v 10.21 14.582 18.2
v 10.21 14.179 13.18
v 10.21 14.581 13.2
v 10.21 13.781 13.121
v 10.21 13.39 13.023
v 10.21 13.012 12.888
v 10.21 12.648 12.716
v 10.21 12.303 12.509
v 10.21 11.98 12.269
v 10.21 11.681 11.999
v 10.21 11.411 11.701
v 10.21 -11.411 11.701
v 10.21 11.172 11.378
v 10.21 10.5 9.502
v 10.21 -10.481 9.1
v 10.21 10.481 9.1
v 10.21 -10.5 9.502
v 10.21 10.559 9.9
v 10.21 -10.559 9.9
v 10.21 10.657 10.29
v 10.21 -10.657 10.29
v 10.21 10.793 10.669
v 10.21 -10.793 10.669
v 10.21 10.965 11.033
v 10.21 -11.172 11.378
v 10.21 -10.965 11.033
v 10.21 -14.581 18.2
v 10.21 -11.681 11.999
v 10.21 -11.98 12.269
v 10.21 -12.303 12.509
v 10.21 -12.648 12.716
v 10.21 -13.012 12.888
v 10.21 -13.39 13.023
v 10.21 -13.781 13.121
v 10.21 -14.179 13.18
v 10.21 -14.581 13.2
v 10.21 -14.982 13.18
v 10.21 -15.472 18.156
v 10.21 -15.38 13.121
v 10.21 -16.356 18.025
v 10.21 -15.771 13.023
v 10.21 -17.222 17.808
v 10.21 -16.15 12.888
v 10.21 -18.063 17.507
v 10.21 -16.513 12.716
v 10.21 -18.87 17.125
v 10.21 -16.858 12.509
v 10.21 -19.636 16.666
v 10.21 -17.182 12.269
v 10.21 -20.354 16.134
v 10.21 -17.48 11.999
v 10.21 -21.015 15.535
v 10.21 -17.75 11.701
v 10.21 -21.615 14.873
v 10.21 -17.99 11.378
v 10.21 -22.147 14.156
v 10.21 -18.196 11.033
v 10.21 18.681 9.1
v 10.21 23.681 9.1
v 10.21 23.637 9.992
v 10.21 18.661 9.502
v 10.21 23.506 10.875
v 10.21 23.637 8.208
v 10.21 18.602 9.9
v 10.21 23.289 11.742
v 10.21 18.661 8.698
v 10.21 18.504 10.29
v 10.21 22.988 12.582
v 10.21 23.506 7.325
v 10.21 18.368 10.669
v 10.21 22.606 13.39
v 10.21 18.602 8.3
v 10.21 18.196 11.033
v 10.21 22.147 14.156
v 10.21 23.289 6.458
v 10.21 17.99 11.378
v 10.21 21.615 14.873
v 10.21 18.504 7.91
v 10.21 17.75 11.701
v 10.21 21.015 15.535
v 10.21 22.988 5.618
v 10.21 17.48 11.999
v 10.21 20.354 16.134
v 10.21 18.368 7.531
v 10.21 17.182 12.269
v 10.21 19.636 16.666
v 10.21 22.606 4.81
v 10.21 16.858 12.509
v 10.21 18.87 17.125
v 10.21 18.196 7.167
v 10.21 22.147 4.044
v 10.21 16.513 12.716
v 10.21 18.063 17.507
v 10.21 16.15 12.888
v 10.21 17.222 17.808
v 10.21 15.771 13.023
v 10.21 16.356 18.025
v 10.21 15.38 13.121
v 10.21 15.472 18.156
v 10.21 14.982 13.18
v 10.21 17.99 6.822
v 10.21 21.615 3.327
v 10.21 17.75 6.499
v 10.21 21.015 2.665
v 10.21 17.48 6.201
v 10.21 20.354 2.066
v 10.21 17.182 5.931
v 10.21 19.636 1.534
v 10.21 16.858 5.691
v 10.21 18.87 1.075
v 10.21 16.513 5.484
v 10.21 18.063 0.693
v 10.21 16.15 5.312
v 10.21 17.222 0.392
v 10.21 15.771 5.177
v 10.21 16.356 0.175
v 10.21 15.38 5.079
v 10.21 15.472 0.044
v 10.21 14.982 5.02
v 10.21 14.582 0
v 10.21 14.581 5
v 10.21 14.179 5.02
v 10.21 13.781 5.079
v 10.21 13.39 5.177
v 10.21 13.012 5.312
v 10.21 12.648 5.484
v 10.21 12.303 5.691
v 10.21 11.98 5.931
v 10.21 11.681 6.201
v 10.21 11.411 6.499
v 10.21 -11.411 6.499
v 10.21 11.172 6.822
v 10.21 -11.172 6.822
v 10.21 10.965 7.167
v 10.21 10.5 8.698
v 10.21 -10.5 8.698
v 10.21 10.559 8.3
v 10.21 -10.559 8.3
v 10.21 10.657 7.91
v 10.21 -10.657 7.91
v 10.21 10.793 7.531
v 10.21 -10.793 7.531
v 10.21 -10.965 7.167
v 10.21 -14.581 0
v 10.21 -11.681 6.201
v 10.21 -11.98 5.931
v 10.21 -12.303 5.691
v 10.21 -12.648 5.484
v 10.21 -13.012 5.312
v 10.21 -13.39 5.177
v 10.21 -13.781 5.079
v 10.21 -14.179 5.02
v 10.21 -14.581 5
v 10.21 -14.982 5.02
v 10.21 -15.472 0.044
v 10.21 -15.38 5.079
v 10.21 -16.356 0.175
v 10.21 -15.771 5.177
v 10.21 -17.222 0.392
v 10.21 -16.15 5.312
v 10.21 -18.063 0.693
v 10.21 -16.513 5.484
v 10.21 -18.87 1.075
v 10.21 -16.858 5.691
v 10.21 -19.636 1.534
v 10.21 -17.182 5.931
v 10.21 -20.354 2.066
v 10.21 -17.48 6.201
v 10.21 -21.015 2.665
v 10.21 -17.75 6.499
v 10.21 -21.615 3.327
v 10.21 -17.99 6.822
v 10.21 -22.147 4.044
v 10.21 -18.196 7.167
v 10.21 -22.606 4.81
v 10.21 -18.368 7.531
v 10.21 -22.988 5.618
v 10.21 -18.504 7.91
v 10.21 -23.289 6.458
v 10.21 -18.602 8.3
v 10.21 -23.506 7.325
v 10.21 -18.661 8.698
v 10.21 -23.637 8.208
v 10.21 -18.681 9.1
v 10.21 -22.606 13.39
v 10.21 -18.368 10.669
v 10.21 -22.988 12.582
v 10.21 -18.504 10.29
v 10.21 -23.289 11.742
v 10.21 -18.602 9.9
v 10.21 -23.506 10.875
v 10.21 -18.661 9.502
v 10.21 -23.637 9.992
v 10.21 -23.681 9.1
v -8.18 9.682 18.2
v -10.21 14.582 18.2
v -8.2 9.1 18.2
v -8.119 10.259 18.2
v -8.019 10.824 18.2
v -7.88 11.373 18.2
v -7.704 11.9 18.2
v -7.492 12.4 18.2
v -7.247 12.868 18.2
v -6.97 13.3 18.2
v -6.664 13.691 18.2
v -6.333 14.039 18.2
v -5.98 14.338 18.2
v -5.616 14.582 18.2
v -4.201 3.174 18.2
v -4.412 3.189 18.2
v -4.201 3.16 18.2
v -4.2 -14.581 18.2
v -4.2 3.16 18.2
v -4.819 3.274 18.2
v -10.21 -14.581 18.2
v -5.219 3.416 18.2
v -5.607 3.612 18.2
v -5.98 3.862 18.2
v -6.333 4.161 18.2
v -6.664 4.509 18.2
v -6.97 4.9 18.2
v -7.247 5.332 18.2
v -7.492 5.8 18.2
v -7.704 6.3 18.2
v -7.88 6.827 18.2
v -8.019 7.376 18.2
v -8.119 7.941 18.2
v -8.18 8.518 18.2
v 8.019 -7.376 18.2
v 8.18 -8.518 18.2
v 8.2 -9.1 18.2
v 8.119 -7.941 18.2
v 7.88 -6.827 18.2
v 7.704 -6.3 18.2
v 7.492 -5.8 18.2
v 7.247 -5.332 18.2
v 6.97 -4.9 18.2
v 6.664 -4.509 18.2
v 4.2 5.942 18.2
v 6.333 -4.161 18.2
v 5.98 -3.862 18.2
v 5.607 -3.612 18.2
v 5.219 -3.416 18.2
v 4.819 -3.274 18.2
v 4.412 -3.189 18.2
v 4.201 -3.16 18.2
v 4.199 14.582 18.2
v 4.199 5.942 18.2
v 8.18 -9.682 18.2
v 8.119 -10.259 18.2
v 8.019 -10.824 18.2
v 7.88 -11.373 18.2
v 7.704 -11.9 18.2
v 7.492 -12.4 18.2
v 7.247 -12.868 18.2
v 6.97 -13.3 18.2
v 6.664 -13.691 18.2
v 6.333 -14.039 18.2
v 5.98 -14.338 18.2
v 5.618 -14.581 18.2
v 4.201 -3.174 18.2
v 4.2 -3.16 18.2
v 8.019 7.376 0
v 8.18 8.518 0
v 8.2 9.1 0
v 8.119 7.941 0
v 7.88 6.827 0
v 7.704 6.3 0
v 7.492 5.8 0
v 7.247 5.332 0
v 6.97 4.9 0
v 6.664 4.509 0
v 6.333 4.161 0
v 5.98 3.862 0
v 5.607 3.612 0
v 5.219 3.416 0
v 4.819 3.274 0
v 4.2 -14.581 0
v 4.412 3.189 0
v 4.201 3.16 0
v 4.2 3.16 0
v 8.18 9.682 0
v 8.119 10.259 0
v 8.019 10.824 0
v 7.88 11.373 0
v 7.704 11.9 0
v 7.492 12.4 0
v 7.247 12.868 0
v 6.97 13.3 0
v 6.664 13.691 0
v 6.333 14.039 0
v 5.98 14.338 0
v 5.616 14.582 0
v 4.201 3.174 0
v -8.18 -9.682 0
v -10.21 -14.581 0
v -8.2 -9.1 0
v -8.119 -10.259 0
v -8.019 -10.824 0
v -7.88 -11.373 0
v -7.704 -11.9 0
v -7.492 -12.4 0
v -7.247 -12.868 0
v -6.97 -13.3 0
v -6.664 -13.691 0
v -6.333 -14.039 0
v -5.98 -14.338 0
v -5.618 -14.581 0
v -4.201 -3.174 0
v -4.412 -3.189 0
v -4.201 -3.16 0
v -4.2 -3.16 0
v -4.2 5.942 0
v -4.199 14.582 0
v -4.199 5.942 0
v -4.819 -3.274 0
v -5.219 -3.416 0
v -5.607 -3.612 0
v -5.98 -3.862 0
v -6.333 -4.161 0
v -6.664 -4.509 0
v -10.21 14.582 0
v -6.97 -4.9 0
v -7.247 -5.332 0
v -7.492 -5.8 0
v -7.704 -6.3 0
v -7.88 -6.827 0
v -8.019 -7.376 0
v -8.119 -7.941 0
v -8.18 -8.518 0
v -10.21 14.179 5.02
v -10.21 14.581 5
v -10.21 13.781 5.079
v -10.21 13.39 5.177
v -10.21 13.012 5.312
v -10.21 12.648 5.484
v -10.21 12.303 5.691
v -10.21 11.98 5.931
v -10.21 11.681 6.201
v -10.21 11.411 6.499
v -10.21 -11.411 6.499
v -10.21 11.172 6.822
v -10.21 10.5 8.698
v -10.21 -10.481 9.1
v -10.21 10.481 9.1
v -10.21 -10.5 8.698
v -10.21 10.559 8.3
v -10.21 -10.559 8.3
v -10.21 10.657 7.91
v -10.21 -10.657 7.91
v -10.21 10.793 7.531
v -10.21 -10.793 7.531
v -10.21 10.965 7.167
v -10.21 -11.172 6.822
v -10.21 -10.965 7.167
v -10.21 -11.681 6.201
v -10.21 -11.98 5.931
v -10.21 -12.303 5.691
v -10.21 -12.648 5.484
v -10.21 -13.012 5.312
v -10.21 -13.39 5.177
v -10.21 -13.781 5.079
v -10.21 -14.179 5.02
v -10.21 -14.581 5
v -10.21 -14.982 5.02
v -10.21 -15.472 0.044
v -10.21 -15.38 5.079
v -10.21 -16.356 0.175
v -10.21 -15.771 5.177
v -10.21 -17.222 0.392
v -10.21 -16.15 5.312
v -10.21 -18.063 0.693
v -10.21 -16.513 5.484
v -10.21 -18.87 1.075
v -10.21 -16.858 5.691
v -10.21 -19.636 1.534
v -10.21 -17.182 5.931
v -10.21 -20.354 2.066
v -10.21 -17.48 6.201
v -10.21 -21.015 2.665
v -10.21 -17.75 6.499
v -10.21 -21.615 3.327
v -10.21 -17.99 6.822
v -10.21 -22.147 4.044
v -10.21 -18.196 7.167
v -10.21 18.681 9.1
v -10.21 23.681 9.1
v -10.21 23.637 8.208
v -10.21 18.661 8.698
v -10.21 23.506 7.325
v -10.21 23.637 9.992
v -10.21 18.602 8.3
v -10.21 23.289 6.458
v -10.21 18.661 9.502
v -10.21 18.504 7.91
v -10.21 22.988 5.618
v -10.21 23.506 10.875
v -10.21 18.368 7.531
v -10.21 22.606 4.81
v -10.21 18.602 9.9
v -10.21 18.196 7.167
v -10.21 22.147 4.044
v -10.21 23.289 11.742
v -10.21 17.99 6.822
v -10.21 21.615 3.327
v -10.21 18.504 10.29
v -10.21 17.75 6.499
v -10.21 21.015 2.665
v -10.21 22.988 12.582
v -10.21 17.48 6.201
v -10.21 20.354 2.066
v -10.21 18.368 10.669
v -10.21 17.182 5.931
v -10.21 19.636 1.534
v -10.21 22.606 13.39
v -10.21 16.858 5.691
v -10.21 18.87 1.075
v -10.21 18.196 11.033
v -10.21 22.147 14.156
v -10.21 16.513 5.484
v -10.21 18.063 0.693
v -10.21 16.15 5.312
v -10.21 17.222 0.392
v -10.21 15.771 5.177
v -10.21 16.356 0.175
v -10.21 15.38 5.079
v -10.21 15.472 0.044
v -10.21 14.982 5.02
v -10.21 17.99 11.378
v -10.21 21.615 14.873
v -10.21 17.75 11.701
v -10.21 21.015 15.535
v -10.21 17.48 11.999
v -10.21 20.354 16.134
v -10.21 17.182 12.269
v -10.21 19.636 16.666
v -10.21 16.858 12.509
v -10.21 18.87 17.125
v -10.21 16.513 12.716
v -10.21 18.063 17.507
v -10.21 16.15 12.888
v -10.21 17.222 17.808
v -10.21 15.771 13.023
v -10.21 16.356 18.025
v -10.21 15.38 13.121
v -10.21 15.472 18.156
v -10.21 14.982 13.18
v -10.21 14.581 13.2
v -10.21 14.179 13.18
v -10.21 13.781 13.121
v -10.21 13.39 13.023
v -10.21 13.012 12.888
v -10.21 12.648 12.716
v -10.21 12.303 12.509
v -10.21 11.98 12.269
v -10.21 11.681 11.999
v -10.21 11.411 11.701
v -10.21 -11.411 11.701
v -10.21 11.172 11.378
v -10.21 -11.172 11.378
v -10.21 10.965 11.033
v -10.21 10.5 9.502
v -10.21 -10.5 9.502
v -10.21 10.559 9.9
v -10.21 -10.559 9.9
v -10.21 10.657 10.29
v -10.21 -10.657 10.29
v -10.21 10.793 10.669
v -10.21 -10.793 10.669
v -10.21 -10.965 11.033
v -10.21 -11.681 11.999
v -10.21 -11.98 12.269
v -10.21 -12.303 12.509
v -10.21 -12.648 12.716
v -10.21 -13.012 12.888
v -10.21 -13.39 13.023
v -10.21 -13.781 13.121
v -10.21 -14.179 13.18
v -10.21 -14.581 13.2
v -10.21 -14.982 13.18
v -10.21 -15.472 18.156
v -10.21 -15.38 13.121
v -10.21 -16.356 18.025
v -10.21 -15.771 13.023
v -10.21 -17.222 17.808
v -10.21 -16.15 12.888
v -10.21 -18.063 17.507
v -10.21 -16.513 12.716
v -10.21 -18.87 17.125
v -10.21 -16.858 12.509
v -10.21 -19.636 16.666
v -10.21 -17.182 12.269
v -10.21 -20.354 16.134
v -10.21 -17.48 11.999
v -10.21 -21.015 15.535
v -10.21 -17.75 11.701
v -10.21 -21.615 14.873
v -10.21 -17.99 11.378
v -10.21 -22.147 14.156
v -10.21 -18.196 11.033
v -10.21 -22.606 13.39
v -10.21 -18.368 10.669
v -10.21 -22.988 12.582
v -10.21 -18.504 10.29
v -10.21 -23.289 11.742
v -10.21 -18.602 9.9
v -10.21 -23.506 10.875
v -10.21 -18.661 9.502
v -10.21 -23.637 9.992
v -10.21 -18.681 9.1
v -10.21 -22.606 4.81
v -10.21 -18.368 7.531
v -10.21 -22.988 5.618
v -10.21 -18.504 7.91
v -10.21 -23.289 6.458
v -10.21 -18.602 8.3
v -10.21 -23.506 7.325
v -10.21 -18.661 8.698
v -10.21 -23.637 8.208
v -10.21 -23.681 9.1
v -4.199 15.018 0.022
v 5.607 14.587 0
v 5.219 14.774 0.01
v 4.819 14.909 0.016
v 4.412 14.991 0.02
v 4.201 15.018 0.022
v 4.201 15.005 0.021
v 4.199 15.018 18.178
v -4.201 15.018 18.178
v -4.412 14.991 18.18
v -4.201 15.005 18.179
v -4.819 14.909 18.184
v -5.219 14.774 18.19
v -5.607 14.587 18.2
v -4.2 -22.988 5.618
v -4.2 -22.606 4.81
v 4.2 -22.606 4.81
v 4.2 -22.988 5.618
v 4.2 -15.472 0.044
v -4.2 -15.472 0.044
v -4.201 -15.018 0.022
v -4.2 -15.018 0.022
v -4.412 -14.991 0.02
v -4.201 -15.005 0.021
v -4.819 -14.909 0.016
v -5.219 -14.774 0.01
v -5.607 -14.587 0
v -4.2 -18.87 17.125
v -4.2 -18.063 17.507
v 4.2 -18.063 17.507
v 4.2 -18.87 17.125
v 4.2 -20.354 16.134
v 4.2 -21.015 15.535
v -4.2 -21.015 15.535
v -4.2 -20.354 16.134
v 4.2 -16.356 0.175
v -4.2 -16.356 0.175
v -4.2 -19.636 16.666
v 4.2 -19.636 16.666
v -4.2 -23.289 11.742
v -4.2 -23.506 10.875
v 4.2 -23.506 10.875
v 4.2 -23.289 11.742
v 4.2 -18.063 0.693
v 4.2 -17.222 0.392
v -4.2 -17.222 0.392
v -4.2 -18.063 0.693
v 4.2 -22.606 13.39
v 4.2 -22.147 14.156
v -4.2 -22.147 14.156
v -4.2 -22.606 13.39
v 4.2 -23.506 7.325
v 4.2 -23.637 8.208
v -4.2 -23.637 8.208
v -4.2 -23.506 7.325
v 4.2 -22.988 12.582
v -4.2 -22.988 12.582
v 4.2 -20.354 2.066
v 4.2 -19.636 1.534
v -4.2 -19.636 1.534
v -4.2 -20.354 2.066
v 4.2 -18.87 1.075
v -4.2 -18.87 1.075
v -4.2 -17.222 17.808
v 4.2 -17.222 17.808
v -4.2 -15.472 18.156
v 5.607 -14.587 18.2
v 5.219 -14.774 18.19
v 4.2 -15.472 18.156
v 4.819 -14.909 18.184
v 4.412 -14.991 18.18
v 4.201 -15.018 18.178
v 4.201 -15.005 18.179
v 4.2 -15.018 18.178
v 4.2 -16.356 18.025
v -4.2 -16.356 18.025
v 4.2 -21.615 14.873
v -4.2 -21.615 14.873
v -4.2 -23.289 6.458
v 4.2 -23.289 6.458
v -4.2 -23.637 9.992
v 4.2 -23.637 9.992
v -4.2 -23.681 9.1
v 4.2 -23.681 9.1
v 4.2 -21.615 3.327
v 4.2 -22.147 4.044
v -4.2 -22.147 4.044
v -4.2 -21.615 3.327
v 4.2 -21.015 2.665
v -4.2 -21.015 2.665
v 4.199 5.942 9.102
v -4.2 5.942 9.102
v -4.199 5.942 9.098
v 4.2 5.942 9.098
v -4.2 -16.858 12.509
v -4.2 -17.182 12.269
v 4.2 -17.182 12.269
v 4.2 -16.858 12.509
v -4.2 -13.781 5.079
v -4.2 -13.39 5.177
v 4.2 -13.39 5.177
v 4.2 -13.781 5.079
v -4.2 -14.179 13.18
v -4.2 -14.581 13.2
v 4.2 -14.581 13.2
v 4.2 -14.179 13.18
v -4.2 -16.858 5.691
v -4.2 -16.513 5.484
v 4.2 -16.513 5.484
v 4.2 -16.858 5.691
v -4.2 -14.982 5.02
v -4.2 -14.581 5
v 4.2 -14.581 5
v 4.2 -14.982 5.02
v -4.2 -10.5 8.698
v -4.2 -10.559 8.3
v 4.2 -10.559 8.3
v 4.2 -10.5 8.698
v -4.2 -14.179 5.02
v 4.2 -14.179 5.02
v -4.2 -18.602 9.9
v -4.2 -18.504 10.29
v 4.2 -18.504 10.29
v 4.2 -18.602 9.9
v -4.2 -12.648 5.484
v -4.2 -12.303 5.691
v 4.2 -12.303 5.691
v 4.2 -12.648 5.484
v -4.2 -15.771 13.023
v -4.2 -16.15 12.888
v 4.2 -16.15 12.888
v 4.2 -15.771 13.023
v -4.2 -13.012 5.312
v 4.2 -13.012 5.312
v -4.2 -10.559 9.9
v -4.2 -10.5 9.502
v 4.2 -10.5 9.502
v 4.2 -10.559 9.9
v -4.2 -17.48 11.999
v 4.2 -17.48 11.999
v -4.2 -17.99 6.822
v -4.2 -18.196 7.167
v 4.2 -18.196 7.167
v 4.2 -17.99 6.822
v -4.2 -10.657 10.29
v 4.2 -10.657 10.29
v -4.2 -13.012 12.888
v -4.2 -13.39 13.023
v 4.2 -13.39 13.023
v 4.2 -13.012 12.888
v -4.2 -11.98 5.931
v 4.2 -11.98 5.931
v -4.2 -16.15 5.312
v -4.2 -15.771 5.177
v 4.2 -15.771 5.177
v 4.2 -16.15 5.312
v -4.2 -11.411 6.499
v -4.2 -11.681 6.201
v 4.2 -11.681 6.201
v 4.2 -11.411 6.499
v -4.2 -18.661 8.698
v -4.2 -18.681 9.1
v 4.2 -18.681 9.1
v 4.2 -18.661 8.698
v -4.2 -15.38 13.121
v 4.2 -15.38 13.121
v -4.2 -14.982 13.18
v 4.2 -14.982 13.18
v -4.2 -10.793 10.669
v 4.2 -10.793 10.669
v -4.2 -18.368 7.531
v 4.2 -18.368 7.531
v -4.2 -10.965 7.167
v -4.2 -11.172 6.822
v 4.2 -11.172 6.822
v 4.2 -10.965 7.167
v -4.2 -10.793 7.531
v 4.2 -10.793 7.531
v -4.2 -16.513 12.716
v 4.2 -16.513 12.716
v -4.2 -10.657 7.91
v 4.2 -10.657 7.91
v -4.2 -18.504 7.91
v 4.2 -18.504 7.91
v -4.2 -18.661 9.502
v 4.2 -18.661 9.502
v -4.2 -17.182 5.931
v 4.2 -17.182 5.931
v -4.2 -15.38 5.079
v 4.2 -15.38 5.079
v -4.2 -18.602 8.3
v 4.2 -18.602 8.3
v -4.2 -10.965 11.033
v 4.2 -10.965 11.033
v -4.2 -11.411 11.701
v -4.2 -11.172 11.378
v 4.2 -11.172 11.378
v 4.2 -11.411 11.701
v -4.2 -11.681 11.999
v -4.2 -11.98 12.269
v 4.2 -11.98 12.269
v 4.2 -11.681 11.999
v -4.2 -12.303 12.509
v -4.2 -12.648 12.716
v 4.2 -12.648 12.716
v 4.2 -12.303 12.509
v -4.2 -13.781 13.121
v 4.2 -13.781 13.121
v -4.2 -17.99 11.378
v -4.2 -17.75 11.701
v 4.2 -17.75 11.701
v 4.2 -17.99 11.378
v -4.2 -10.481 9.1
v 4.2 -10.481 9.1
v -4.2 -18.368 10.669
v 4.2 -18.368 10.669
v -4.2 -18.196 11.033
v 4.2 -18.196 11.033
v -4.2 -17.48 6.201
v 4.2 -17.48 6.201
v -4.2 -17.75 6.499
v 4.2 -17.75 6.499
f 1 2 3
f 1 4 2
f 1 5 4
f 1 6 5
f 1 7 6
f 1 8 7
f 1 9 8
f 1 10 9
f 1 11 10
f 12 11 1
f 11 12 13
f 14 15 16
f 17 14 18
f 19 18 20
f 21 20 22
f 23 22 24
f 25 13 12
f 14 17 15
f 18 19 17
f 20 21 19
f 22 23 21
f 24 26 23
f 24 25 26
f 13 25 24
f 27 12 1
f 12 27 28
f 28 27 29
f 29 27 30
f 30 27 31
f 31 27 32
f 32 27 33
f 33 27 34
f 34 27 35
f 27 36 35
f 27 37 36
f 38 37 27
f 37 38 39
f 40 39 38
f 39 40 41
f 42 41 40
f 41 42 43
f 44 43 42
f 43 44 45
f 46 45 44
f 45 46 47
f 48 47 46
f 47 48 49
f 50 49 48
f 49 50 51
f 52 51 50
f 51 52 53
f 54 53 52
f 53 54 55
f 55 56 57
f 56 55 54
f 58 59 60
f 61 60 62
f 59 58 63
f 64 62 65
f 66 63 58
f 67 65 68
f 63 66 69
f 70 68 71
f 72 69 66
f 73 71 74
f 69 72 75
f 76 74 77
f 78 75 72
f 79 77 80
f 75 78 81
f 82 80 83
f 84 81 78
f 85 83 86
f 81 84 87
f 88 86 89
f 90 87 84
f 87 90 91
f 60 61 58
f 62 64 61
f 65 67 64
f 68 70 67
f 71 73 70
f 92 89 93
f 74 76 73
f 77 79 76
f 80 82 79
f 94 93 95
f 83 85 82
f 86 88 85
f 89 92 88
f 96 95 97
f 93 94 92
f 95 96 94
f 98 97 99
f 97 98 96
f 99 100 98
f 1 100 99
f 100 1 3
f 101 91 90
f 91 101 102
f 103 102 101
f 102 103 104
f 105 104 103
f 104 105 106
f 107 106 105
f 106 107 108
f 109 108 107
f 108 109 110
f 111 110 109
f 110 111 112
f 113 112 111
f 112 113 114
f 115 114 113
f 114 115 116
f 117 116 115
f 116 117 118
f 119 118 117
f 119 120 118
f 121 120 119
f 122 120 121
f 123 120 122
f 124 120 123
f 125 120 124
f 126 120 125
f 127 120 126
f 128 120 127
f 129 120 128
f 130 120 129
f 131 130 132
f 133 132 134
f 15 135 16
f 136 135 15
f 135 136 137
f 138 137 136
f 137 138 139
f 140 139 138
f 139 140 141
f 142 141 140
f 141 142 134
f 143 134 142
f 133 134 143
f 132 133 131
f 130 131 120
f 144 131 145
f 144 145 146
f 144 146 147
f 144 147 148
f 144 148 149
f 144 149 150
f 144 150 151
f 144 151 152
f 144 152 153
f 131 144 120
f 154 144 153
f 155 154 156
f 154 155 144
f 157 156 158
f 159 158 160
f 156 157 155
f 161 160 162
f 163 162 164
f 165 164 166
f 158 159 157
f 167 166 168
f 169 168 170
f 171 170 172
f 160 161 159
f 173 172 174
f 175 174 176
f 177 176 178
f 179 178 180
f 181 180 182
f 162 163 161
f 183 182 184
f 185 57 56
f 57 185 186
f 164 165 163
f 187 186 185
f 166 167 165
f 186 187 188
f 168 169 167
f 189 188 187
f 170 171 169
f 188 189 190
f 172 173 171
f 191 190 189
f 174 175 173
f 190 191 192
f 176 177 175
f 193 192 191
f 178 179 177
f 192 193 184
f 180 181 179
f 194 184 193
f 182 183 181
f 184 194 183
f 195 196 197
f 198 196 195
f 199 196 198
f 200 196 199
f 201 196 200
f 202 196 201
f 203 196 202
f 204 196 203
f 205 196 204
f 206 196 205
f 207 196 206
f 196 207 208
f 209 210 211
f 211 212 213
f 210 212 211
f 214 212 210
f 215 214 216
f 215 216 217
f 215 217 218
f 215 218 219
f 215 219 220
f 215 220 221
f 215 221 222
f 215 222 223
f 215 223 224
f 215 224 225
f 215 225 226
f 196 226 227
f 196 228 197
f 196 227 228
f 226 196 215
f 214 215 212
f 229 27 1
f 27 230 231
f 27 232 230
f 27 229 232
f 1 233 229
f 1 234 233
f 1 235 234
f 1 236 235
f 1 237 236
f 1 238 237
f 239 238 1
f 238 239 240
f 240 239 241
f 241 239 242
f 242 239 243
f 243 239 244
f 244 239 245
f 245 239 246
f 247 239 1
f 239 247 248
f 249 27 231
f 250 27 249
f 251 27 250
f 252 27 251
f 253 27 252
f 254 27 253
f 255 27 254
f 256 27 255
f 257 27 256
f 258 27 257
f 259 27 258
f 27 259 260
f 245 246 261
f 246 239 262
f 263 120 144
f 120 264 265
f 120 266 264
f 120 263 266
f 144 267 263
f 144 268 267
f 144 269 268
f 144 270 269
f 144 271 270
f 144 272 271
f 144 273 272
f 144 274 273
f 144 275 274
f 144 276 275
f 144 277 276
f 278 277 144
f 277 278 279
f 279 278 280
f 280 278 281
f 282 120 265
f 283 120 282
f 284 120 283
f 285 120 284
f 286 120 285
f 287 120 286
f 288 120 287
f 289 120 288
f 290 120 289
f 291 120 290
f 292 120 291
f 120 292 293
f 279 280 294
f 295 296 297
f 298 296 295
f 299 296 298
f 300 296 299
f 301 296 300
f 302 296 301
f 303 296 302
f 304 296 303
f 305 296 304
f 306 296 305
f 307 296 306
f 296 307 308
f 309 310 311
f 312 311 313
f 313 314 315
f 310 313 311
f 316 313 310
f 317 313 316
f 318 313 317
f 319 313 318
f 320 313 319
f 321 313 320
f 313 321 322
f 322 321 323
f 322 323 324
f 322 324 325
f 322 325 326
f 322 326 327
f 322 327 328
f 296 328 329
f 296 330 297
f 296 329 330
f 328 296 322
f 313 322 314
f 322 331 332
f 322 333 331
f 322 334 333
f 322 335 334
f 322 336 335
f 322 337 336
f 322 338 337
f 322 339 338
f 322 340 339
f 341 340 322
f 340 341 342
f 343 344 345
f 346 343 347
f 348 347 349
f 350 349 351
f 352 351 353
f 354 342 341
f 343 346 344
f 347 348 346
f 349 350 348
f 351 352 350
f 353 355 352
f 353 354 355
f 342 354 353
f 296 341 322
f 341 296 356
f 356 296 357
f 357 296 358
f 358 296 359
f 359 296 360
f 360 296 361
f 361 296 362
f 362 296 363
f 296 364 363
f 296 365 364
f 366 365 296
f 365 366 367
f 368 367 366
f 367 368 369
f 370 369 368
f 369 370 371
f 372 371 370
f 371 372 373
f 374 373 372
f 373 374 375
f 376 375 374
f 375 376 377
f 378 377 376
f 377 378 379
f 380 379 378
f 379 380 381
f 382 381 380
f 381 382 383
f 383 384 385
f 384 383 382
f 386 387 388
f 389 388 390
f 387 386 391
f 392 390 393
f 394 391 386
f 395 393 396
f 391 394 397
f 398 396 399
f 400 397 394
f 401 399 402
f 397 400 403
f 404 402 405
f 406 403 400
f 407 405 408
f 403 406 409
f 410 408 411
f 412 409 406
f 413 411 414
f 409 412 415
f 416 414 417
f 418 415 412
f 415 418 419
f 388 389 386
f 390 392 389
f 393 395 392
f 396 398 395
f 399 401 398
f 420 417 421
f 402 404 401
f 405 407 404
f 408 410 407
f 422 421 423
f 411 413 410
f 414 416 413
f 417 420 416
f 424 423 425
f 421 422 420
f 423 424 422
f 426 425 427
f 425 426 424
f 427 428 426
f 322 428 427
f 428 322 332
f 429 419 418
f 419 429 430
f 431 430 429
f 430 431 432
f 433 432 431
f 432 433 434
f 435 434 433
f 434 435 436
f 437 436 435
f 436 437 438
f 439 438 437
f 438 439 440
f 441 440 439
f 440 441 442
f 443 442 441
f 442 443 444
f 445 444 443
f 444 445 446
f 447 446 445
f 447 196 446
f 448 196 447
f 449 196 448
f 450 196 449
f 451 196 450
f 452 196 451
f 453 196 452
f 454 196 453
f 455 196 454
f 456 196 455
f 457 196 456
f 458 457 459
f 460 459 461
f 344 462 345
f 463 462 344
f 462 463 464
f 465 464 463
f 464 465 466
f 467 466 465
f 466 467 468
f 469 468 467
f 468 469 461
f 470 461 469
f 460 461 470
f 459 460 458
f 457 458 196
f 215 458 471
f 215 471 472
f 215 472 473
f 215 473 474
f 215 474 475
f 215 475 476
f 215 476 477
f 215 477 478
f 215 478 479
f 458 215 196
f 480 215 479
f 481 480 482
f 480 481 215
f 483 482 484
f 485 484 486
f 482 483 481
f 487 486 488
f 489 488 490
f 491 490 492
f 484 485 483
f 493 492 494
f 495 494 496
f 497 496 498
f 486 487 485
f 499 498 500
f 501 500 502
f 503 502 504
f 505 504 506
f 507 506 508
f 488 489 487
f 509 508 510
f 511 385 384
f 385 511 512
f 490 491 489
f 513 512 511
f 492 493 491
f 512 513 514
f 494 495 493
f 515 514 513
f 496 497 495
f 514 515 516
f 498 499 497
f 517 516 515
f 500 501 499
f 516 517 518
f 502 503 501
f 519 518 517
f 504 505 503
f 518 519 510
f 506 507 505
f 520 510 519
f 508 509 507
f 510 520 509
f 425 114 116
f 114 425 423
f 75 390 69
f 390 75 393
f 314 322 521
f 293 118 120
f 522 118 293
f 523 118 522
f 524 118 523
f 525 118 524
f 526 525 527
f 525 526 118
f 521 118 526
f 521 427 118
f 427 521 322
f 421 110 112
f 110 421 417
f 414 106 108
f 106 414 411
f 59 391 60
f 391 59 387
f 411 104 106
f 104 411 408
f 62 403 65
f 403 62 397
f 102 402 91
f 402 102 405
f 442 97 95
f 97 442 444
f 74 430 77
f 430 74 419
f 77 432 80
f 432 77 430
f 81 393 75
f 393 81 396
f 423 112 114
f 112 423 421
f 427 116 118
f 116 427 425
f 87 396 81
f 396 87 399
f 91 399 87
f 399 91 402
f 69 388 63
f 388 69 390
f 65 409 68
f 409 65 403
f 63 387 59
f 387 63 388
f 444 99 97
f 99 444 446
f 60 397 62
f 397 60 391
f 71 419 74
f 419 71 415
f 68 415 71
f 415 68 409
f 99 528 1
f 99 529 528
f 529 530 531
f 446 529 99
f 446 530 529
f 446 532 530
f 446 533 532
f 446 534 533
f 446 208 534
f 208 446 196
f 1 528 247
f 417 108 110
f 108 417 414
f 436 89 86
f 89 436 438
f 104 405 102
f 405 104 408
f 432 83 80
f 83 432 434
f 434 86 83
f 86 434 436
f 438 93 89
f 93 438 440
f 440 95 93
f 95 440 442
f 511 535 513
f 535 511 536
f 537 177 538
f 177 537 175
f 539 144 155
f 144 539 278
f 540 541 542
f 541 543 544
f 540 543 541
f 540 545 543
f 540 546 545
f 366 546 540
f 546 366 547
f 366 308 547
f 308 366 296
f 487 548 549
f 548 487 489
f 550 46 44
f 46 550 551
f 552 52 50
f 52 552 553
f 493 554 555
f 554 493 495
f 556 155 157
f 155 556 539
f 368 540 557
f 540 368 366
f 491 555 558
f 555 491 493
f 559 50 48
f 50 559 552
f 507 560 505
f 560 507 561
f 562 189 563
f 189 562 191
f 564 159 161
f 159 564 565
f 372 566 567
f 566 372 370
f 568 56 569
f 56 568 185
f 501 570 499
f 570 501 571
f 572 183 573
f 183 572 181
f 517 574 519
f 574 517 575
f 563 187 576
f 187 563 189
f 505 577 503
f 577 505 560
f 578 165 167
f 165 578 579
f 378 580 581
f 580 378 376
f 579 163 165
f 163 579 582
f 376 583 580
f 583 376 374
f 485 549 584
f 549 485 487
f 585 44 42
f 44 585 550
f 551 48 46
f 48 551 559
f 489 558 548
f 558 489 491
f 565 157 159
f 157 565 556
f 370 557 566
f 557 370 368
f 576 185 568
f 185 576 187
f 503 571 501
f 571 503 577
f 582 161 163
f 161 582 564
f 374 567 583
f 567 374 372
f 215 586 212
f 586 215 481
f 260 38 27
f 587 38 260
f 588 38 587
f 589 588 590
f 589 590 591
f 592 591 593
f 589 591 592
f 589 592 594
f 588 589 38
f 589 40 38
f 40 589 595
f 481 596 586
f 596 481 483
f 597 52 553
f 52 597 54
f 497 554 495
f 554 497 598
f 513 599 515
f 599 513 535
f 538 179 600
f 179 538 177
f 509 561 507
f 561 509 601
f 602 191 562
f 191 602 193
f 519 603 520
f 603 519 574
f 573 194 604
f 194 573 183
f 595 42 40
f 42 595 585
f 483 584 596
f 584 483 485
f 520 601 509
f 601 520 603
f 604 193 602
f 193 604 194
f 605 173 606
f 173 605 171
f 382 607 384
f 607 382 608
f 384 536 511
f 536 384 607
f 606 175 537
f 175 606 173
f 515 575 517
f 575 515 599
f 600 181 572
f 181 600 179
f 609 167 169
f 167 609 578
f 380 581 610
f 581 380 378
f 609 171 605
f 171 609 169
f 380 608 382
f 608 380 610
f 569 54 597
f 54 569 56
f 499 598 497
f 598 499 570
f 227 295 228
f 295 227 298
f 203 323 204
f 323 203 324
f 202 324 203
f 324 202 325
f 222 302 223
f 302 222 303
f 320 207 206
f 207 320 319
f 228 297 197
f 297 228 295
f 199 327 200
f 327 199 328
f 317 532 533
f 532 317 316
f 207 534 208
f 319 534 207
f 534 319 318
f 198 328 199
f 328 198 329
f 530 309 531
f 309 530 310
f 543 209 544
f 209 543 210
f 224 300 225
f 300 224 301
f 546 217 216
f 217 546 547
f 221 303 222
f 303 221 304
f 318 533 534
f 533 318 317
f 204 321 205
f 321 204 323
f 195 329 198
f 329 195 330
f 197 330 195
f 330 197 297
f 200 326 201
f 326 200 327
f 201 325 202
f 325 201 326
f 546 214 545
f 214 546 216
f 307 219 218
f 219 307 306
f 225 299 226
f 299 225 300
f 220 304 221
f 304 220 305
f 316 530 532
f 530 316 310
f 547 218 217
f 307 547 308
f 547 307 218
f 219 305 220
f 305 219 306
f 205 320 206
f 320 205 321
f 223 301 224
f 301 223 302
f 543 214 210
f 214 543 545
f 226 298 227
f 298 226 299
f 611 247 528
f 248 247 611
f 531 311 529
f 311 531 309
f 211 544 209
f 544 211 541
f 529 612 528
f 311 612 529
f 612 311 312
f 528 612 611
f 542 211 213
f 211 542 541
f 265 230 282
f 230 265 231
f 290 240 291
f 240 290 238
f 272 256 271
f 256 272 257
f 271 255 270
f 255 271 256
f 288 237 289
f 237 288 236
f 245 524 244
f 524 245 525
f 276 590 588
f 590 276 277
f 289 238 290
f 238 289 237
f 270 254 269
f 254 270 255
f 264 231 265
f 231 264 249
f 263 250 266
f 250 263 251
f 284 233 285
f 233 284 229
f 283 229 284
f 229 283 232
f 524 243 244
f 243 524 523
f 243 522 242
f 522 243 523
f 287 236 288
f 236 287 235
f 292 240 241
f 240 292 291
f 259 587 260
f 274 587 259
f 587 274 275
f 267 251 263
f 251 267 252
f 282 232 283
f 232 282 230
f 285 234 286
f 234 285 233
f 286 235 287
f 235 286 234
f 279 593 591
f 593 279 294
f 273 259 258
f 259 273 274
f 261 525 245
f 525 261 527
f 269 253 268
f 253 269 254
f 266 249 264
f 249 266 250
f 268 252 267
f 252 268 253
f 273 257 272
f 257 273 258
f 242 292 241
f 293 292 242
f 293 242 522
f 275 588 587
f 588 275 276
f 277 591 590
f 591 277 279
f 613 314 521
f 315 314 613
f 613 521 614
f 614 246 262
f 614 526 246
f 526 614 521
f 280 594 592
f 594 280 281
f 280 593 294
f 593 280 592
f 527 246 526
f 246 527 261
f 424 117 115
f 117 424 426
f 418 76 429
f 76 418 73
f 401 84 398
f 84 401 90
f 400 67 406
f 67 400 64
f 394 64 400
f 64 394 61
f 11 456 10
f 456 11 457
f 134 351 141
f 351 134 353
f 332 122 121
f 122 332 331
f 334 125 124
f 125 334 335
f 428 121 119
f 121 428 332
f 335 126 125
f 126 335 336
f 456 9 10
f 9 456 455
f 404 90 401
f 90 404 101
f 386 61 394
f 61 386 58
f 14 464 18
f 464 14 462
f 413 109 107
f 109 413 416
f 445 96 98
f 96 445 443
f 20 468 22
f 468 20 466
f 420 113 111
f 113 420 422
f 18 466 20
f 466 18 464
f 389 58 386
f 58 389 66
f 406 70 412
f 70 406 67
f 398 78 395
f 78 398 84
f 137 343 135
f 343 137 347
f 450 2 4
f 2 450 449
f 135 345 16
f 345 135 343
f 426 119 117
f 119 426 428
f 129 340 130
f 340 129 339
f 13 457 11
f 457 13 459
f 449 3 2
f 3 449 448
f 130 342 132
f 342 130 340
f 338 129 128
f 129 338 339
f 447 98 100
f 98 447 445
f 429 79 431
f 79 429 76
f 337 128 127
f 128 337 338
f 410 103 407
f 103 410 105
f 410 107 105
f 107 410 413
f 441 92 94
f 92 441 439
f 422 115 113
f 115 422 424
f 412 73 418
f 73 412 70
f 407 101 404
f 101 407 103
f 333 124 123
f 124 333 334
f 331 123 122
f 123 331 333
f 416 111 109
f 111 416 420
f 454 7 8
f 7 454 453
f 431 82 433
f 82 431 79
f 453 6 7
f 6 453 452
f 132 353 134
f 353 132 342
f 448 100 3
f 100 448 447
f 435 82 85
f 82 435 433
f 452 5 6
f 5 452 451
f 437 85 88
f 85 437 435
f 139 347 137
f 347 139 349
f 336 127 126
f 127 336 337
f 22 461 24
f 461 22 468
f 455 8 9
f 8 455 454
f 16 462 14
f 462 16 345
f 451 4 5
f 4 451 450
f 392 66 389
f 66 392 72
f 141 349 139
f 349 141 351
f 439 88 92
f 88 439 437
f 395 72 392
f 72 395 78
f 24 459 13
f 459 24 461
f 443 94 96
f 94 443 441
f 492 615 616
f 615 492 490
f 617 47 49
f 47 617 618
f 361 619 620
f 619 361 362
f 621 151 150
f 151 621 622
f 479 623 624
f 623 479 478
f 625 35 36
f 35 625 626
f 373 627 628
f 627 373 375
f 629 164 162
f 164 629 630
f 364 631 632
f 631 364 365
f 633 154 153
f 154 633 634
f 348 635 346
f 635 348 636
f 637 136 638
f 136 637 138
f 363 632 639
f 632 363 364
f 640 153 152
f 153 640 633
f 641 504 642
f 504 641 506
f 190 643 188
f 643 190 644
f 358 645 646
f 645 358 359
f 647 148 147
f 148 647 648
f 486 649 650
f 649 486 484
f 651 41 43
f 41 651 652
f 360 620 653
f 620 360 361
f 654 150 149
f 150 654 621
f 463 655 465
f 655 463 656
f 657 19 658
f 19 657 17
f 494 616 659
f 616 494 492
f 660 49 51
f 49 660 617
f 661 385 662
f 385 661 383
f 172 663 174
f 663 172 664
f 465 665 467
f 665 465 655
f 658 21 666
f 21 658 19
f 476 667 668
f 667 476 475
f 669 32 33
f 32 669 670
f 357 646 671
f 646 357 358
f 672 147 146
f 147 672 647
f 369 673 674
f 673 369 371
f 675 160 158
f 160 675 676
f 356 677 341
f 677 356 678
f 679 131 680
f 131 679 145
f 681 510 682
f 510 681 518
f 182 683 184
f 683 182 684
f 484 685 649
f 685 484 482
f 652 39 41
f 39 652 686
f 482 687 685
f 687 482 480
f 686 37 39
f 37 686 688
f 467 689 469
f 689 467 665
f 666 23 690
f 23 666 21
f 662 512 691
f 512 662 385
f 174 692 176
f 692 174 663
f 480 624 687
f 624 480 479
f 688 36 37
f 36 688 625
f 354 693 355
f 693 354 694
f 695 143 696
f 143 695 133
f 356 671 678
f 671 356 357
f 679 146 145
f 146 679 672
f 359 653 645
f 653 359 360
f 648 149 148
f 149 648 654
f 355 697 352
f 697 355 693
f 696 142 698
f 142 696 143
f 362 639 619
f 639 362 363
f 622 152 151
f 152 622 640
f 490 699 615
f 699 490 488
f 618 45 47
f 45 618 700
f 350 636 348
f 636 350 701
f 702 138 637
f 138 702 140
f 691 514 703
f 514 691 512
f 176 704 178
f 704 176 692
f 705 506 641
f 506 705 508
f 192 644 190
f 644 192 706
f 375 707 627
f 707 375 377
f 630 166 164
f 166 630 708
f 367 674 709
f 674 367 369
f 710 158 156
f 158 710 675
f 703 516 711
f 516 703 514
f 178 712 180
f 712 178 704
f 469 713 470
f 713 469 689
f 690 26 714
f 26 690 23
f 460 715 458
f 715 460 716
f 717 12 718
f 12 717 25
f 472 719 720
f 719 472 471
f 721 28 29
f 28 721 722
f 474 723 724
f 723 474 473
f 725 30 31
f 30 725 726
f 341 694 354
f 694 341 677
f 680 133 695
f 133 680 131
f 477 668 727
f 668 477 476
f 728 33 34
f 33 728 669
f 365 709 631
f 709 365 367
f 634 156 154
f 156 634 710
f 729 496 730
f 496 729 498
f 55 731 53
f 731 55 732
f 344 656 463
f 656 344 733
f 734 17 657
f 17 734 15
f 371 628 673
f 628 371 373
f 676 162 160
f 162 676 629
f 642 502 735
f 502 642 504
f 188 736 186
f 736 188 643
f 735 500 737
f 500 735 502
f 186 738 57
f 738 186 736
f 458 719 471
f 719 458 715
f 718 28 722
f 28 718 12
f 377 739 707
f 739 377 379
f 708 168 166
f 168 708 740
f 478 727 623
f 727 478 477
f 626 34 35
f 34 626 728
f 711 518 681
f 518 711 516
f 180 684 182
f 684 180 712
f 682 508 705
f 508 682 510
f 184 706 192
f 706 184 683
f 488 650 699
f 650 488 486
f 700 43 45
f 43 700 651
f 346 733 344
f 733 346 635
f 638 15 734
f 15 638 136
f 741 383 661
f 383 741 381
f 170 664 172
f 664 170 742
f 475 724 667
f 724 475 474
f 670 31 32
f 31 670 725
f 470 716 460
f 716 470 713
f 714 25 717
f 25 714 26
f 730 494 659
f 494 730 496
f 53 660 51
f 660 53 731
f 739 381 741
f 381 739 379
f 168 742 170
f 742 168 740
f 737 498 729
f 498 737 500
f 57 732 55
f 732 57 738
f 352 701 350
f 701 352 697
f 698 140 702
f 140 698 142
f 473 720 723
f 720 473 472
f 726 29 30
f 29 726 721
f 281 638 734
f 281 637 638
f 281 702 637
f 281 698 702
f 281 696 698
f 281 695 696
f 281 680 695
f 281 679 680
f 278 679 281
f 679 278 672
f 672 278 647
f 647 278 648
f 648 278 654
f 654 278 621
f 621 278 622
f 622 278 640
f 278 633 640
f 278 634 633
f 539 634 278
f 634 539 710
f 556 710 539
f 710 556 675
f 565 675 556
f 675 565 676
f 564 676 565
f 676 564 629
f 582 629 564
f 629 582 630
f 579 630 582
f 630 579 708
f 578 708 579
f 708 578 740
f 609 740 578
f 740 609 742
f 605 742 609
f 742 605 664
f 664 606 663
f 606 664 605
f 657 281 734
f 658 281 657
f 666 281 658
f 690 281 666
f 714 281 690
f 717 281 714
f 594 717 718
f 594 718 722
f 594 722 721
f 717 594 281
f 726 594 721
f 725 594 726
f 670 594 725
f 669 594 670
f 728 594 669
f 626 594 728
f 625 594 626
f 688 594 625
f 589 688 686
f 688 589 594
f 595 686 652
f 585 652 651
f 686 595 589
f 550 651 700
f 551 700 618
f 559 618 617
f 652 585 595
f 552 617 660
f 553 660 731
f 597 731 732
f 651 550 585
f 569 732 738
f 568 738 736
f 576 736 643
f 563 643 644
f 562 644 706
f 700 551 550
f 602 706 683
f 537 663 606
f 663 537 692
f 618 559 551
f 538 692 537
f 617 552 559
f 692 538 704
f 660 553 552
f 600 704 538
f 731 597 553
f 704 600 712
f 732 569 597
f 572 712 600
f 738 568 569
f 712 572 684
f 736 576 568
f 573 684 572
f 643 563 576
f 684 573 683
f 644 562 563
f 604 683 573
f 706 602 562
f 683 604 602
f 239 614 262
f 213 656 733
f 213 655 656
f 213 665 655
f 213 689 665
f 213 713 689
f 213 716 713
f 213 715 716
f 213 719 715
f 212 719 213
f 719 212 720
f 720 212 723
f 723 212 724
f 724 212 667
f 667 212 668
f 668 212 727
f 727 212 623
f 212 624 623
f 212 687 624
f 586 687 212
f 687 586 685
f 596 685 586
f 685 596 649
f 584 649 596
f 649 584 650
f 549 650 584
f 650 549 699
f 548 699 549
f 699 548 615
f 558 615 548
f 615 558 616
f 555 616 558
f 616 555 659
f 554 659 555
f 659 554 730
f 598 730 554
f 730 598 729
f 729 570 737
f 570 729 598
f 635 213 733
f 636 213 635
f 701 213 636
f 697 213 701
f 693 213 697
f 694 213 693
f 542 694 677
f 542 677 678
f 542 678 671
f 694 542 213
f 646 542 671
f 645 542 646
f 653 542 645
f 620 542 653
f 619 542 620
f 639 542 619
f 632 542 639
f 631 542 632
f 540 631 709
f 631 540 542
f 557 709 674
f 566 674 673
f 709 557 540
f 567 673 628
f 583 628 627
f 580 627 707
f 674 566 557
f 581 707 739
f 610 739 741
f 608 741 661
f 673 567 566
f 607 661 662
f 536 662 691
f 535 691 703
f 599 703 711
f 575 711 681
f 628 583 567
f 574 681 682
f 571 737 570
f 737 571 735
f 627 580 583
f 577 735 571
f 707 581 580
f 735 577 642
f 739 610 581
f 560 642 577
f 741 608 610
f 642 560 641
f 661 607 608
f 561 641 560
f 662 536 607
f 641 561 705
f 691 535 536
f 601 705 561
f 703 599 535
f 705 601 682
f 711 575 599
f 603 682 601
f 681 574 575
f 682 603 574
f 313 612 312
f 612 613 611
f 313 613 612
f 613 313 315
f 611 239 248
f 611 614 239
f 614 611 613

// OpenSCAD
// file: configuration.scad
/*
 * Igor Soares' parallel kinematic XY i2
 * Configuration
 * (C) 2014 by Ígor Bruno Pereira Soares
 *
 * This project is free: you can redistribute it and/or modify
 * it under the terms of the GNU General Public License as published by
 * the Free Software Foundation, either version 2 of the License, or
 * (at your option) any later version.
 *
 * This project is distributed in the hope that it will be useful,
 * but WITHOUT ANY WARRANTY; without even the implied warranty of
 * MERCHANTABILITY or FITNESS FOR A PARTICULAR PURPOSE.  See the
 * GNU General Public License for more details.
 *
 * You should have received a copy of the GNU General Public License
 * along with this project.  If not, see <http://www.gnu.org/licenses/>.
 */

LIGHT_WALL_WIDTH = 2.01;
WALL_WIDTH = 5.0;
VERTICAL_SUPPORT_WALL = 0.5;
HORIZONTAL_SUPPORT_WALL = 0.255;

BEARING_DIAMETER = 22.4;
BEARING_WIDTH = 7;
BEARING_SCREW_DIAMETER = 8.2;
BEARING_SCREW_NUT_WIDTH = 13;
BEARING_WASHER_SPACING = 2.5;

LINEAR_BUSHING_DIAMETER = 15.3;
LINEAR_BUSHING_LEN = 24.4;
LINEAR_BUSHING_WALL = 1.0;

ROD_ACTUAL_DIAMETER = 8.0;
ROD_HOLE_DIAMETER = 8.4;

MOTOR_SCREW_DIAMETER = 3.4;
MOTOR_SCREW_MOUNT = 31; // nema 17
MOTOR_SIZE = 43;
MOTOR_MOUNT_INNER_DIAMETER = 30;
MOTOR_BELT_CLEARANCE = 5;

ST = 0.001;
// main file
/*
 * Igor Soares' parallel kinematic XY i2
 * Vertex parts
 * (C) 2014 by Ígor Bruno Pereira Soares
 *
 * This project is free: you can redistribute it and/or modify
 * it under the terms of the GNU General Public License as published by
 * the Free Software Foundation, either version 2 of the License, or
 * (at your option) any later version.
 *
 * This project is distributed in the hope that it will be useful,
 * but WITHOUT ANY WARRANTY; without even the implied warranty of
 * MERCHANTABILITY or FITNESS FOR A PARTICULAR PURPOSE.  See the
 * GNU General Public License for more details.
 *
 * You should have received a copy of the GNU General Public License
 * along with this project.  If not, see <http://www.gnu.org/licenses/>.
 */

include <configuration.scad>

//mirror([1,0,0])
smooth_rods_clamp($fn=64);

module smooth_rods_clamp(
    lwall=LIGHT_WALL_WIDTH,
    wall=WALL_WIDTH,
    bearing_r=BEARING_DIAMETER/2,
    bearing_screw_r=BEARING_SCREW_DIAMETER/2,
    bearing_screw_rod_d=LIGHT_WALL_WIDTH,
    bearing_r=BEARING_DIAMETER/2,
    rod_r=ROD_ACTUAL_DIAMETER/2,
    rod_hole_r=ROD_HOLE_DIAMETER/2)
{
  inner_pos = (rod_hole_r + bearing_screw_rod_d + bearing_screw_r)/cos(45);
  second_pos = -inner_pos;
  central_hole_start = rod_hole_r/cos(45) + ST;

  w = 2*wall + 2*bearing_screw_r;
  h = 2*lwall + 2*rod_r + 2*rod_hole_r;

  translate([0,0,w/2])  difference() {
    union() {
      translate([-h/2,0,-w/2])
        cube([h, inner_pos + ST, w]);
      translate([-h/2,second_pos,-w/2])
        cube([h, -second_pos + ST, w]);

      translate([0, inner_pos, 0])
        rotate([0,90,0])
          cylinder(r=w/2, h=h, center=true);
      translate([0, second_pos, 0])
        rotate([0,90,0])
          cylinder(r=w/2, h=h, center=true);
    }
    //inner bearing screw
    translate([0, inner_pos, 0])
      rotate([0,90,0])
        #cylinder(r=bearing_screw_r, h=h+1, center=true);

    //outer bearing screw
    translate([0, second_pos, 0])
      rotate([0,90,0])
        #cylinder(r=bearing_screw_r, h=h+1, center=true);

    //smooth rod holes
    for (i=[-1, 1]) {
      translate([i*rod_r, 0, 0])
        rotate([i*45,0,0])
          #cylinder(r=rod_hole_r, h=(w + 2*rod_hole_r +1)/cos(45), center=true);
      translate([i*ST, 0, 0])
        rotate([i*45,0,0])
          #cube([2*rod_hole_r, 2*rod_hole_r, (w + 2*rod_hole_r +1)/cos(45)],
                center=true);
    }

    //centerl hole
    translate([-rod_hole_r,second_pos - w/2 -1,-w/2 -1])
      #cube([2*rod_hole_r,
             -second_pos + w/2 + central_hole_start +1 +ST,
             w +2]);

  }
}
